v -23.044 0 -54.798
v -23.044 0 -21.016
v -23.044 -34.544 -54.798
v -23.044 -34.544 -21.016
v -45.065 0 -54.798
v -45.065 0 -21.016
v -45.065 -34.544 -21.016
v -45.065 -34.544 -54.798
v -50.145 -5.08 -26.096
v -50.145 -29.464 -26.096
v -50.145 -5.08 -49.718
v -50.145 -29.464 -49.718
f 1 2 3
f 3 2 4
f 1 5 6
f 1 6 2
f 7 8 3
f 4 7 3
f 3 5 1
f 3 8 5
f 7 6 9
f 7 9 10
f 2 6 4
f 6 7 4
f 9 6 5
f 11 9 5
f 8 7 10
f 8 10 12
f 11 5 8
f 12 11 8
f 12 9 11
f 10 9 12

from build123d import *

# Parameters (mm, degrees)
F1_E0_BOTTOM_W = 27.100160718
F1_E0_BOTTOM_H = 34.544
F2_DEPTH       = 33.782
F3_SIZE        = 5.08


with BuildPart() as f2:
    # F1_E0_bottom (on explicit) → F2 (new body)
    with BuildSketch(Plane(origin=(-50.1445159316, 0, -21.0164524615), x_dir=(1, 0, 0), z_dir=(0, 0, -1))):
        with Locations((13.550080359, 17.272)):
            Rectangle(F1_E0_BOTTOM_W, F1_E0_BOTTOM_H)
    extrude(amount=F2_DEPTH)

    # F3
    f3_edges = [f2.edges().sort_by_distance(p)[0] for p in [
        (-50.144516, -34.544, -37.907452),
        (-50.144516, 0, -37.907452),
        (-50.144516, -17.272, -21.016452),
        (-50.144516, -17.272, -54.798452),
    ]]
    chamfer(f3_edges, length=F3_SIZE)


solid = f2.part
